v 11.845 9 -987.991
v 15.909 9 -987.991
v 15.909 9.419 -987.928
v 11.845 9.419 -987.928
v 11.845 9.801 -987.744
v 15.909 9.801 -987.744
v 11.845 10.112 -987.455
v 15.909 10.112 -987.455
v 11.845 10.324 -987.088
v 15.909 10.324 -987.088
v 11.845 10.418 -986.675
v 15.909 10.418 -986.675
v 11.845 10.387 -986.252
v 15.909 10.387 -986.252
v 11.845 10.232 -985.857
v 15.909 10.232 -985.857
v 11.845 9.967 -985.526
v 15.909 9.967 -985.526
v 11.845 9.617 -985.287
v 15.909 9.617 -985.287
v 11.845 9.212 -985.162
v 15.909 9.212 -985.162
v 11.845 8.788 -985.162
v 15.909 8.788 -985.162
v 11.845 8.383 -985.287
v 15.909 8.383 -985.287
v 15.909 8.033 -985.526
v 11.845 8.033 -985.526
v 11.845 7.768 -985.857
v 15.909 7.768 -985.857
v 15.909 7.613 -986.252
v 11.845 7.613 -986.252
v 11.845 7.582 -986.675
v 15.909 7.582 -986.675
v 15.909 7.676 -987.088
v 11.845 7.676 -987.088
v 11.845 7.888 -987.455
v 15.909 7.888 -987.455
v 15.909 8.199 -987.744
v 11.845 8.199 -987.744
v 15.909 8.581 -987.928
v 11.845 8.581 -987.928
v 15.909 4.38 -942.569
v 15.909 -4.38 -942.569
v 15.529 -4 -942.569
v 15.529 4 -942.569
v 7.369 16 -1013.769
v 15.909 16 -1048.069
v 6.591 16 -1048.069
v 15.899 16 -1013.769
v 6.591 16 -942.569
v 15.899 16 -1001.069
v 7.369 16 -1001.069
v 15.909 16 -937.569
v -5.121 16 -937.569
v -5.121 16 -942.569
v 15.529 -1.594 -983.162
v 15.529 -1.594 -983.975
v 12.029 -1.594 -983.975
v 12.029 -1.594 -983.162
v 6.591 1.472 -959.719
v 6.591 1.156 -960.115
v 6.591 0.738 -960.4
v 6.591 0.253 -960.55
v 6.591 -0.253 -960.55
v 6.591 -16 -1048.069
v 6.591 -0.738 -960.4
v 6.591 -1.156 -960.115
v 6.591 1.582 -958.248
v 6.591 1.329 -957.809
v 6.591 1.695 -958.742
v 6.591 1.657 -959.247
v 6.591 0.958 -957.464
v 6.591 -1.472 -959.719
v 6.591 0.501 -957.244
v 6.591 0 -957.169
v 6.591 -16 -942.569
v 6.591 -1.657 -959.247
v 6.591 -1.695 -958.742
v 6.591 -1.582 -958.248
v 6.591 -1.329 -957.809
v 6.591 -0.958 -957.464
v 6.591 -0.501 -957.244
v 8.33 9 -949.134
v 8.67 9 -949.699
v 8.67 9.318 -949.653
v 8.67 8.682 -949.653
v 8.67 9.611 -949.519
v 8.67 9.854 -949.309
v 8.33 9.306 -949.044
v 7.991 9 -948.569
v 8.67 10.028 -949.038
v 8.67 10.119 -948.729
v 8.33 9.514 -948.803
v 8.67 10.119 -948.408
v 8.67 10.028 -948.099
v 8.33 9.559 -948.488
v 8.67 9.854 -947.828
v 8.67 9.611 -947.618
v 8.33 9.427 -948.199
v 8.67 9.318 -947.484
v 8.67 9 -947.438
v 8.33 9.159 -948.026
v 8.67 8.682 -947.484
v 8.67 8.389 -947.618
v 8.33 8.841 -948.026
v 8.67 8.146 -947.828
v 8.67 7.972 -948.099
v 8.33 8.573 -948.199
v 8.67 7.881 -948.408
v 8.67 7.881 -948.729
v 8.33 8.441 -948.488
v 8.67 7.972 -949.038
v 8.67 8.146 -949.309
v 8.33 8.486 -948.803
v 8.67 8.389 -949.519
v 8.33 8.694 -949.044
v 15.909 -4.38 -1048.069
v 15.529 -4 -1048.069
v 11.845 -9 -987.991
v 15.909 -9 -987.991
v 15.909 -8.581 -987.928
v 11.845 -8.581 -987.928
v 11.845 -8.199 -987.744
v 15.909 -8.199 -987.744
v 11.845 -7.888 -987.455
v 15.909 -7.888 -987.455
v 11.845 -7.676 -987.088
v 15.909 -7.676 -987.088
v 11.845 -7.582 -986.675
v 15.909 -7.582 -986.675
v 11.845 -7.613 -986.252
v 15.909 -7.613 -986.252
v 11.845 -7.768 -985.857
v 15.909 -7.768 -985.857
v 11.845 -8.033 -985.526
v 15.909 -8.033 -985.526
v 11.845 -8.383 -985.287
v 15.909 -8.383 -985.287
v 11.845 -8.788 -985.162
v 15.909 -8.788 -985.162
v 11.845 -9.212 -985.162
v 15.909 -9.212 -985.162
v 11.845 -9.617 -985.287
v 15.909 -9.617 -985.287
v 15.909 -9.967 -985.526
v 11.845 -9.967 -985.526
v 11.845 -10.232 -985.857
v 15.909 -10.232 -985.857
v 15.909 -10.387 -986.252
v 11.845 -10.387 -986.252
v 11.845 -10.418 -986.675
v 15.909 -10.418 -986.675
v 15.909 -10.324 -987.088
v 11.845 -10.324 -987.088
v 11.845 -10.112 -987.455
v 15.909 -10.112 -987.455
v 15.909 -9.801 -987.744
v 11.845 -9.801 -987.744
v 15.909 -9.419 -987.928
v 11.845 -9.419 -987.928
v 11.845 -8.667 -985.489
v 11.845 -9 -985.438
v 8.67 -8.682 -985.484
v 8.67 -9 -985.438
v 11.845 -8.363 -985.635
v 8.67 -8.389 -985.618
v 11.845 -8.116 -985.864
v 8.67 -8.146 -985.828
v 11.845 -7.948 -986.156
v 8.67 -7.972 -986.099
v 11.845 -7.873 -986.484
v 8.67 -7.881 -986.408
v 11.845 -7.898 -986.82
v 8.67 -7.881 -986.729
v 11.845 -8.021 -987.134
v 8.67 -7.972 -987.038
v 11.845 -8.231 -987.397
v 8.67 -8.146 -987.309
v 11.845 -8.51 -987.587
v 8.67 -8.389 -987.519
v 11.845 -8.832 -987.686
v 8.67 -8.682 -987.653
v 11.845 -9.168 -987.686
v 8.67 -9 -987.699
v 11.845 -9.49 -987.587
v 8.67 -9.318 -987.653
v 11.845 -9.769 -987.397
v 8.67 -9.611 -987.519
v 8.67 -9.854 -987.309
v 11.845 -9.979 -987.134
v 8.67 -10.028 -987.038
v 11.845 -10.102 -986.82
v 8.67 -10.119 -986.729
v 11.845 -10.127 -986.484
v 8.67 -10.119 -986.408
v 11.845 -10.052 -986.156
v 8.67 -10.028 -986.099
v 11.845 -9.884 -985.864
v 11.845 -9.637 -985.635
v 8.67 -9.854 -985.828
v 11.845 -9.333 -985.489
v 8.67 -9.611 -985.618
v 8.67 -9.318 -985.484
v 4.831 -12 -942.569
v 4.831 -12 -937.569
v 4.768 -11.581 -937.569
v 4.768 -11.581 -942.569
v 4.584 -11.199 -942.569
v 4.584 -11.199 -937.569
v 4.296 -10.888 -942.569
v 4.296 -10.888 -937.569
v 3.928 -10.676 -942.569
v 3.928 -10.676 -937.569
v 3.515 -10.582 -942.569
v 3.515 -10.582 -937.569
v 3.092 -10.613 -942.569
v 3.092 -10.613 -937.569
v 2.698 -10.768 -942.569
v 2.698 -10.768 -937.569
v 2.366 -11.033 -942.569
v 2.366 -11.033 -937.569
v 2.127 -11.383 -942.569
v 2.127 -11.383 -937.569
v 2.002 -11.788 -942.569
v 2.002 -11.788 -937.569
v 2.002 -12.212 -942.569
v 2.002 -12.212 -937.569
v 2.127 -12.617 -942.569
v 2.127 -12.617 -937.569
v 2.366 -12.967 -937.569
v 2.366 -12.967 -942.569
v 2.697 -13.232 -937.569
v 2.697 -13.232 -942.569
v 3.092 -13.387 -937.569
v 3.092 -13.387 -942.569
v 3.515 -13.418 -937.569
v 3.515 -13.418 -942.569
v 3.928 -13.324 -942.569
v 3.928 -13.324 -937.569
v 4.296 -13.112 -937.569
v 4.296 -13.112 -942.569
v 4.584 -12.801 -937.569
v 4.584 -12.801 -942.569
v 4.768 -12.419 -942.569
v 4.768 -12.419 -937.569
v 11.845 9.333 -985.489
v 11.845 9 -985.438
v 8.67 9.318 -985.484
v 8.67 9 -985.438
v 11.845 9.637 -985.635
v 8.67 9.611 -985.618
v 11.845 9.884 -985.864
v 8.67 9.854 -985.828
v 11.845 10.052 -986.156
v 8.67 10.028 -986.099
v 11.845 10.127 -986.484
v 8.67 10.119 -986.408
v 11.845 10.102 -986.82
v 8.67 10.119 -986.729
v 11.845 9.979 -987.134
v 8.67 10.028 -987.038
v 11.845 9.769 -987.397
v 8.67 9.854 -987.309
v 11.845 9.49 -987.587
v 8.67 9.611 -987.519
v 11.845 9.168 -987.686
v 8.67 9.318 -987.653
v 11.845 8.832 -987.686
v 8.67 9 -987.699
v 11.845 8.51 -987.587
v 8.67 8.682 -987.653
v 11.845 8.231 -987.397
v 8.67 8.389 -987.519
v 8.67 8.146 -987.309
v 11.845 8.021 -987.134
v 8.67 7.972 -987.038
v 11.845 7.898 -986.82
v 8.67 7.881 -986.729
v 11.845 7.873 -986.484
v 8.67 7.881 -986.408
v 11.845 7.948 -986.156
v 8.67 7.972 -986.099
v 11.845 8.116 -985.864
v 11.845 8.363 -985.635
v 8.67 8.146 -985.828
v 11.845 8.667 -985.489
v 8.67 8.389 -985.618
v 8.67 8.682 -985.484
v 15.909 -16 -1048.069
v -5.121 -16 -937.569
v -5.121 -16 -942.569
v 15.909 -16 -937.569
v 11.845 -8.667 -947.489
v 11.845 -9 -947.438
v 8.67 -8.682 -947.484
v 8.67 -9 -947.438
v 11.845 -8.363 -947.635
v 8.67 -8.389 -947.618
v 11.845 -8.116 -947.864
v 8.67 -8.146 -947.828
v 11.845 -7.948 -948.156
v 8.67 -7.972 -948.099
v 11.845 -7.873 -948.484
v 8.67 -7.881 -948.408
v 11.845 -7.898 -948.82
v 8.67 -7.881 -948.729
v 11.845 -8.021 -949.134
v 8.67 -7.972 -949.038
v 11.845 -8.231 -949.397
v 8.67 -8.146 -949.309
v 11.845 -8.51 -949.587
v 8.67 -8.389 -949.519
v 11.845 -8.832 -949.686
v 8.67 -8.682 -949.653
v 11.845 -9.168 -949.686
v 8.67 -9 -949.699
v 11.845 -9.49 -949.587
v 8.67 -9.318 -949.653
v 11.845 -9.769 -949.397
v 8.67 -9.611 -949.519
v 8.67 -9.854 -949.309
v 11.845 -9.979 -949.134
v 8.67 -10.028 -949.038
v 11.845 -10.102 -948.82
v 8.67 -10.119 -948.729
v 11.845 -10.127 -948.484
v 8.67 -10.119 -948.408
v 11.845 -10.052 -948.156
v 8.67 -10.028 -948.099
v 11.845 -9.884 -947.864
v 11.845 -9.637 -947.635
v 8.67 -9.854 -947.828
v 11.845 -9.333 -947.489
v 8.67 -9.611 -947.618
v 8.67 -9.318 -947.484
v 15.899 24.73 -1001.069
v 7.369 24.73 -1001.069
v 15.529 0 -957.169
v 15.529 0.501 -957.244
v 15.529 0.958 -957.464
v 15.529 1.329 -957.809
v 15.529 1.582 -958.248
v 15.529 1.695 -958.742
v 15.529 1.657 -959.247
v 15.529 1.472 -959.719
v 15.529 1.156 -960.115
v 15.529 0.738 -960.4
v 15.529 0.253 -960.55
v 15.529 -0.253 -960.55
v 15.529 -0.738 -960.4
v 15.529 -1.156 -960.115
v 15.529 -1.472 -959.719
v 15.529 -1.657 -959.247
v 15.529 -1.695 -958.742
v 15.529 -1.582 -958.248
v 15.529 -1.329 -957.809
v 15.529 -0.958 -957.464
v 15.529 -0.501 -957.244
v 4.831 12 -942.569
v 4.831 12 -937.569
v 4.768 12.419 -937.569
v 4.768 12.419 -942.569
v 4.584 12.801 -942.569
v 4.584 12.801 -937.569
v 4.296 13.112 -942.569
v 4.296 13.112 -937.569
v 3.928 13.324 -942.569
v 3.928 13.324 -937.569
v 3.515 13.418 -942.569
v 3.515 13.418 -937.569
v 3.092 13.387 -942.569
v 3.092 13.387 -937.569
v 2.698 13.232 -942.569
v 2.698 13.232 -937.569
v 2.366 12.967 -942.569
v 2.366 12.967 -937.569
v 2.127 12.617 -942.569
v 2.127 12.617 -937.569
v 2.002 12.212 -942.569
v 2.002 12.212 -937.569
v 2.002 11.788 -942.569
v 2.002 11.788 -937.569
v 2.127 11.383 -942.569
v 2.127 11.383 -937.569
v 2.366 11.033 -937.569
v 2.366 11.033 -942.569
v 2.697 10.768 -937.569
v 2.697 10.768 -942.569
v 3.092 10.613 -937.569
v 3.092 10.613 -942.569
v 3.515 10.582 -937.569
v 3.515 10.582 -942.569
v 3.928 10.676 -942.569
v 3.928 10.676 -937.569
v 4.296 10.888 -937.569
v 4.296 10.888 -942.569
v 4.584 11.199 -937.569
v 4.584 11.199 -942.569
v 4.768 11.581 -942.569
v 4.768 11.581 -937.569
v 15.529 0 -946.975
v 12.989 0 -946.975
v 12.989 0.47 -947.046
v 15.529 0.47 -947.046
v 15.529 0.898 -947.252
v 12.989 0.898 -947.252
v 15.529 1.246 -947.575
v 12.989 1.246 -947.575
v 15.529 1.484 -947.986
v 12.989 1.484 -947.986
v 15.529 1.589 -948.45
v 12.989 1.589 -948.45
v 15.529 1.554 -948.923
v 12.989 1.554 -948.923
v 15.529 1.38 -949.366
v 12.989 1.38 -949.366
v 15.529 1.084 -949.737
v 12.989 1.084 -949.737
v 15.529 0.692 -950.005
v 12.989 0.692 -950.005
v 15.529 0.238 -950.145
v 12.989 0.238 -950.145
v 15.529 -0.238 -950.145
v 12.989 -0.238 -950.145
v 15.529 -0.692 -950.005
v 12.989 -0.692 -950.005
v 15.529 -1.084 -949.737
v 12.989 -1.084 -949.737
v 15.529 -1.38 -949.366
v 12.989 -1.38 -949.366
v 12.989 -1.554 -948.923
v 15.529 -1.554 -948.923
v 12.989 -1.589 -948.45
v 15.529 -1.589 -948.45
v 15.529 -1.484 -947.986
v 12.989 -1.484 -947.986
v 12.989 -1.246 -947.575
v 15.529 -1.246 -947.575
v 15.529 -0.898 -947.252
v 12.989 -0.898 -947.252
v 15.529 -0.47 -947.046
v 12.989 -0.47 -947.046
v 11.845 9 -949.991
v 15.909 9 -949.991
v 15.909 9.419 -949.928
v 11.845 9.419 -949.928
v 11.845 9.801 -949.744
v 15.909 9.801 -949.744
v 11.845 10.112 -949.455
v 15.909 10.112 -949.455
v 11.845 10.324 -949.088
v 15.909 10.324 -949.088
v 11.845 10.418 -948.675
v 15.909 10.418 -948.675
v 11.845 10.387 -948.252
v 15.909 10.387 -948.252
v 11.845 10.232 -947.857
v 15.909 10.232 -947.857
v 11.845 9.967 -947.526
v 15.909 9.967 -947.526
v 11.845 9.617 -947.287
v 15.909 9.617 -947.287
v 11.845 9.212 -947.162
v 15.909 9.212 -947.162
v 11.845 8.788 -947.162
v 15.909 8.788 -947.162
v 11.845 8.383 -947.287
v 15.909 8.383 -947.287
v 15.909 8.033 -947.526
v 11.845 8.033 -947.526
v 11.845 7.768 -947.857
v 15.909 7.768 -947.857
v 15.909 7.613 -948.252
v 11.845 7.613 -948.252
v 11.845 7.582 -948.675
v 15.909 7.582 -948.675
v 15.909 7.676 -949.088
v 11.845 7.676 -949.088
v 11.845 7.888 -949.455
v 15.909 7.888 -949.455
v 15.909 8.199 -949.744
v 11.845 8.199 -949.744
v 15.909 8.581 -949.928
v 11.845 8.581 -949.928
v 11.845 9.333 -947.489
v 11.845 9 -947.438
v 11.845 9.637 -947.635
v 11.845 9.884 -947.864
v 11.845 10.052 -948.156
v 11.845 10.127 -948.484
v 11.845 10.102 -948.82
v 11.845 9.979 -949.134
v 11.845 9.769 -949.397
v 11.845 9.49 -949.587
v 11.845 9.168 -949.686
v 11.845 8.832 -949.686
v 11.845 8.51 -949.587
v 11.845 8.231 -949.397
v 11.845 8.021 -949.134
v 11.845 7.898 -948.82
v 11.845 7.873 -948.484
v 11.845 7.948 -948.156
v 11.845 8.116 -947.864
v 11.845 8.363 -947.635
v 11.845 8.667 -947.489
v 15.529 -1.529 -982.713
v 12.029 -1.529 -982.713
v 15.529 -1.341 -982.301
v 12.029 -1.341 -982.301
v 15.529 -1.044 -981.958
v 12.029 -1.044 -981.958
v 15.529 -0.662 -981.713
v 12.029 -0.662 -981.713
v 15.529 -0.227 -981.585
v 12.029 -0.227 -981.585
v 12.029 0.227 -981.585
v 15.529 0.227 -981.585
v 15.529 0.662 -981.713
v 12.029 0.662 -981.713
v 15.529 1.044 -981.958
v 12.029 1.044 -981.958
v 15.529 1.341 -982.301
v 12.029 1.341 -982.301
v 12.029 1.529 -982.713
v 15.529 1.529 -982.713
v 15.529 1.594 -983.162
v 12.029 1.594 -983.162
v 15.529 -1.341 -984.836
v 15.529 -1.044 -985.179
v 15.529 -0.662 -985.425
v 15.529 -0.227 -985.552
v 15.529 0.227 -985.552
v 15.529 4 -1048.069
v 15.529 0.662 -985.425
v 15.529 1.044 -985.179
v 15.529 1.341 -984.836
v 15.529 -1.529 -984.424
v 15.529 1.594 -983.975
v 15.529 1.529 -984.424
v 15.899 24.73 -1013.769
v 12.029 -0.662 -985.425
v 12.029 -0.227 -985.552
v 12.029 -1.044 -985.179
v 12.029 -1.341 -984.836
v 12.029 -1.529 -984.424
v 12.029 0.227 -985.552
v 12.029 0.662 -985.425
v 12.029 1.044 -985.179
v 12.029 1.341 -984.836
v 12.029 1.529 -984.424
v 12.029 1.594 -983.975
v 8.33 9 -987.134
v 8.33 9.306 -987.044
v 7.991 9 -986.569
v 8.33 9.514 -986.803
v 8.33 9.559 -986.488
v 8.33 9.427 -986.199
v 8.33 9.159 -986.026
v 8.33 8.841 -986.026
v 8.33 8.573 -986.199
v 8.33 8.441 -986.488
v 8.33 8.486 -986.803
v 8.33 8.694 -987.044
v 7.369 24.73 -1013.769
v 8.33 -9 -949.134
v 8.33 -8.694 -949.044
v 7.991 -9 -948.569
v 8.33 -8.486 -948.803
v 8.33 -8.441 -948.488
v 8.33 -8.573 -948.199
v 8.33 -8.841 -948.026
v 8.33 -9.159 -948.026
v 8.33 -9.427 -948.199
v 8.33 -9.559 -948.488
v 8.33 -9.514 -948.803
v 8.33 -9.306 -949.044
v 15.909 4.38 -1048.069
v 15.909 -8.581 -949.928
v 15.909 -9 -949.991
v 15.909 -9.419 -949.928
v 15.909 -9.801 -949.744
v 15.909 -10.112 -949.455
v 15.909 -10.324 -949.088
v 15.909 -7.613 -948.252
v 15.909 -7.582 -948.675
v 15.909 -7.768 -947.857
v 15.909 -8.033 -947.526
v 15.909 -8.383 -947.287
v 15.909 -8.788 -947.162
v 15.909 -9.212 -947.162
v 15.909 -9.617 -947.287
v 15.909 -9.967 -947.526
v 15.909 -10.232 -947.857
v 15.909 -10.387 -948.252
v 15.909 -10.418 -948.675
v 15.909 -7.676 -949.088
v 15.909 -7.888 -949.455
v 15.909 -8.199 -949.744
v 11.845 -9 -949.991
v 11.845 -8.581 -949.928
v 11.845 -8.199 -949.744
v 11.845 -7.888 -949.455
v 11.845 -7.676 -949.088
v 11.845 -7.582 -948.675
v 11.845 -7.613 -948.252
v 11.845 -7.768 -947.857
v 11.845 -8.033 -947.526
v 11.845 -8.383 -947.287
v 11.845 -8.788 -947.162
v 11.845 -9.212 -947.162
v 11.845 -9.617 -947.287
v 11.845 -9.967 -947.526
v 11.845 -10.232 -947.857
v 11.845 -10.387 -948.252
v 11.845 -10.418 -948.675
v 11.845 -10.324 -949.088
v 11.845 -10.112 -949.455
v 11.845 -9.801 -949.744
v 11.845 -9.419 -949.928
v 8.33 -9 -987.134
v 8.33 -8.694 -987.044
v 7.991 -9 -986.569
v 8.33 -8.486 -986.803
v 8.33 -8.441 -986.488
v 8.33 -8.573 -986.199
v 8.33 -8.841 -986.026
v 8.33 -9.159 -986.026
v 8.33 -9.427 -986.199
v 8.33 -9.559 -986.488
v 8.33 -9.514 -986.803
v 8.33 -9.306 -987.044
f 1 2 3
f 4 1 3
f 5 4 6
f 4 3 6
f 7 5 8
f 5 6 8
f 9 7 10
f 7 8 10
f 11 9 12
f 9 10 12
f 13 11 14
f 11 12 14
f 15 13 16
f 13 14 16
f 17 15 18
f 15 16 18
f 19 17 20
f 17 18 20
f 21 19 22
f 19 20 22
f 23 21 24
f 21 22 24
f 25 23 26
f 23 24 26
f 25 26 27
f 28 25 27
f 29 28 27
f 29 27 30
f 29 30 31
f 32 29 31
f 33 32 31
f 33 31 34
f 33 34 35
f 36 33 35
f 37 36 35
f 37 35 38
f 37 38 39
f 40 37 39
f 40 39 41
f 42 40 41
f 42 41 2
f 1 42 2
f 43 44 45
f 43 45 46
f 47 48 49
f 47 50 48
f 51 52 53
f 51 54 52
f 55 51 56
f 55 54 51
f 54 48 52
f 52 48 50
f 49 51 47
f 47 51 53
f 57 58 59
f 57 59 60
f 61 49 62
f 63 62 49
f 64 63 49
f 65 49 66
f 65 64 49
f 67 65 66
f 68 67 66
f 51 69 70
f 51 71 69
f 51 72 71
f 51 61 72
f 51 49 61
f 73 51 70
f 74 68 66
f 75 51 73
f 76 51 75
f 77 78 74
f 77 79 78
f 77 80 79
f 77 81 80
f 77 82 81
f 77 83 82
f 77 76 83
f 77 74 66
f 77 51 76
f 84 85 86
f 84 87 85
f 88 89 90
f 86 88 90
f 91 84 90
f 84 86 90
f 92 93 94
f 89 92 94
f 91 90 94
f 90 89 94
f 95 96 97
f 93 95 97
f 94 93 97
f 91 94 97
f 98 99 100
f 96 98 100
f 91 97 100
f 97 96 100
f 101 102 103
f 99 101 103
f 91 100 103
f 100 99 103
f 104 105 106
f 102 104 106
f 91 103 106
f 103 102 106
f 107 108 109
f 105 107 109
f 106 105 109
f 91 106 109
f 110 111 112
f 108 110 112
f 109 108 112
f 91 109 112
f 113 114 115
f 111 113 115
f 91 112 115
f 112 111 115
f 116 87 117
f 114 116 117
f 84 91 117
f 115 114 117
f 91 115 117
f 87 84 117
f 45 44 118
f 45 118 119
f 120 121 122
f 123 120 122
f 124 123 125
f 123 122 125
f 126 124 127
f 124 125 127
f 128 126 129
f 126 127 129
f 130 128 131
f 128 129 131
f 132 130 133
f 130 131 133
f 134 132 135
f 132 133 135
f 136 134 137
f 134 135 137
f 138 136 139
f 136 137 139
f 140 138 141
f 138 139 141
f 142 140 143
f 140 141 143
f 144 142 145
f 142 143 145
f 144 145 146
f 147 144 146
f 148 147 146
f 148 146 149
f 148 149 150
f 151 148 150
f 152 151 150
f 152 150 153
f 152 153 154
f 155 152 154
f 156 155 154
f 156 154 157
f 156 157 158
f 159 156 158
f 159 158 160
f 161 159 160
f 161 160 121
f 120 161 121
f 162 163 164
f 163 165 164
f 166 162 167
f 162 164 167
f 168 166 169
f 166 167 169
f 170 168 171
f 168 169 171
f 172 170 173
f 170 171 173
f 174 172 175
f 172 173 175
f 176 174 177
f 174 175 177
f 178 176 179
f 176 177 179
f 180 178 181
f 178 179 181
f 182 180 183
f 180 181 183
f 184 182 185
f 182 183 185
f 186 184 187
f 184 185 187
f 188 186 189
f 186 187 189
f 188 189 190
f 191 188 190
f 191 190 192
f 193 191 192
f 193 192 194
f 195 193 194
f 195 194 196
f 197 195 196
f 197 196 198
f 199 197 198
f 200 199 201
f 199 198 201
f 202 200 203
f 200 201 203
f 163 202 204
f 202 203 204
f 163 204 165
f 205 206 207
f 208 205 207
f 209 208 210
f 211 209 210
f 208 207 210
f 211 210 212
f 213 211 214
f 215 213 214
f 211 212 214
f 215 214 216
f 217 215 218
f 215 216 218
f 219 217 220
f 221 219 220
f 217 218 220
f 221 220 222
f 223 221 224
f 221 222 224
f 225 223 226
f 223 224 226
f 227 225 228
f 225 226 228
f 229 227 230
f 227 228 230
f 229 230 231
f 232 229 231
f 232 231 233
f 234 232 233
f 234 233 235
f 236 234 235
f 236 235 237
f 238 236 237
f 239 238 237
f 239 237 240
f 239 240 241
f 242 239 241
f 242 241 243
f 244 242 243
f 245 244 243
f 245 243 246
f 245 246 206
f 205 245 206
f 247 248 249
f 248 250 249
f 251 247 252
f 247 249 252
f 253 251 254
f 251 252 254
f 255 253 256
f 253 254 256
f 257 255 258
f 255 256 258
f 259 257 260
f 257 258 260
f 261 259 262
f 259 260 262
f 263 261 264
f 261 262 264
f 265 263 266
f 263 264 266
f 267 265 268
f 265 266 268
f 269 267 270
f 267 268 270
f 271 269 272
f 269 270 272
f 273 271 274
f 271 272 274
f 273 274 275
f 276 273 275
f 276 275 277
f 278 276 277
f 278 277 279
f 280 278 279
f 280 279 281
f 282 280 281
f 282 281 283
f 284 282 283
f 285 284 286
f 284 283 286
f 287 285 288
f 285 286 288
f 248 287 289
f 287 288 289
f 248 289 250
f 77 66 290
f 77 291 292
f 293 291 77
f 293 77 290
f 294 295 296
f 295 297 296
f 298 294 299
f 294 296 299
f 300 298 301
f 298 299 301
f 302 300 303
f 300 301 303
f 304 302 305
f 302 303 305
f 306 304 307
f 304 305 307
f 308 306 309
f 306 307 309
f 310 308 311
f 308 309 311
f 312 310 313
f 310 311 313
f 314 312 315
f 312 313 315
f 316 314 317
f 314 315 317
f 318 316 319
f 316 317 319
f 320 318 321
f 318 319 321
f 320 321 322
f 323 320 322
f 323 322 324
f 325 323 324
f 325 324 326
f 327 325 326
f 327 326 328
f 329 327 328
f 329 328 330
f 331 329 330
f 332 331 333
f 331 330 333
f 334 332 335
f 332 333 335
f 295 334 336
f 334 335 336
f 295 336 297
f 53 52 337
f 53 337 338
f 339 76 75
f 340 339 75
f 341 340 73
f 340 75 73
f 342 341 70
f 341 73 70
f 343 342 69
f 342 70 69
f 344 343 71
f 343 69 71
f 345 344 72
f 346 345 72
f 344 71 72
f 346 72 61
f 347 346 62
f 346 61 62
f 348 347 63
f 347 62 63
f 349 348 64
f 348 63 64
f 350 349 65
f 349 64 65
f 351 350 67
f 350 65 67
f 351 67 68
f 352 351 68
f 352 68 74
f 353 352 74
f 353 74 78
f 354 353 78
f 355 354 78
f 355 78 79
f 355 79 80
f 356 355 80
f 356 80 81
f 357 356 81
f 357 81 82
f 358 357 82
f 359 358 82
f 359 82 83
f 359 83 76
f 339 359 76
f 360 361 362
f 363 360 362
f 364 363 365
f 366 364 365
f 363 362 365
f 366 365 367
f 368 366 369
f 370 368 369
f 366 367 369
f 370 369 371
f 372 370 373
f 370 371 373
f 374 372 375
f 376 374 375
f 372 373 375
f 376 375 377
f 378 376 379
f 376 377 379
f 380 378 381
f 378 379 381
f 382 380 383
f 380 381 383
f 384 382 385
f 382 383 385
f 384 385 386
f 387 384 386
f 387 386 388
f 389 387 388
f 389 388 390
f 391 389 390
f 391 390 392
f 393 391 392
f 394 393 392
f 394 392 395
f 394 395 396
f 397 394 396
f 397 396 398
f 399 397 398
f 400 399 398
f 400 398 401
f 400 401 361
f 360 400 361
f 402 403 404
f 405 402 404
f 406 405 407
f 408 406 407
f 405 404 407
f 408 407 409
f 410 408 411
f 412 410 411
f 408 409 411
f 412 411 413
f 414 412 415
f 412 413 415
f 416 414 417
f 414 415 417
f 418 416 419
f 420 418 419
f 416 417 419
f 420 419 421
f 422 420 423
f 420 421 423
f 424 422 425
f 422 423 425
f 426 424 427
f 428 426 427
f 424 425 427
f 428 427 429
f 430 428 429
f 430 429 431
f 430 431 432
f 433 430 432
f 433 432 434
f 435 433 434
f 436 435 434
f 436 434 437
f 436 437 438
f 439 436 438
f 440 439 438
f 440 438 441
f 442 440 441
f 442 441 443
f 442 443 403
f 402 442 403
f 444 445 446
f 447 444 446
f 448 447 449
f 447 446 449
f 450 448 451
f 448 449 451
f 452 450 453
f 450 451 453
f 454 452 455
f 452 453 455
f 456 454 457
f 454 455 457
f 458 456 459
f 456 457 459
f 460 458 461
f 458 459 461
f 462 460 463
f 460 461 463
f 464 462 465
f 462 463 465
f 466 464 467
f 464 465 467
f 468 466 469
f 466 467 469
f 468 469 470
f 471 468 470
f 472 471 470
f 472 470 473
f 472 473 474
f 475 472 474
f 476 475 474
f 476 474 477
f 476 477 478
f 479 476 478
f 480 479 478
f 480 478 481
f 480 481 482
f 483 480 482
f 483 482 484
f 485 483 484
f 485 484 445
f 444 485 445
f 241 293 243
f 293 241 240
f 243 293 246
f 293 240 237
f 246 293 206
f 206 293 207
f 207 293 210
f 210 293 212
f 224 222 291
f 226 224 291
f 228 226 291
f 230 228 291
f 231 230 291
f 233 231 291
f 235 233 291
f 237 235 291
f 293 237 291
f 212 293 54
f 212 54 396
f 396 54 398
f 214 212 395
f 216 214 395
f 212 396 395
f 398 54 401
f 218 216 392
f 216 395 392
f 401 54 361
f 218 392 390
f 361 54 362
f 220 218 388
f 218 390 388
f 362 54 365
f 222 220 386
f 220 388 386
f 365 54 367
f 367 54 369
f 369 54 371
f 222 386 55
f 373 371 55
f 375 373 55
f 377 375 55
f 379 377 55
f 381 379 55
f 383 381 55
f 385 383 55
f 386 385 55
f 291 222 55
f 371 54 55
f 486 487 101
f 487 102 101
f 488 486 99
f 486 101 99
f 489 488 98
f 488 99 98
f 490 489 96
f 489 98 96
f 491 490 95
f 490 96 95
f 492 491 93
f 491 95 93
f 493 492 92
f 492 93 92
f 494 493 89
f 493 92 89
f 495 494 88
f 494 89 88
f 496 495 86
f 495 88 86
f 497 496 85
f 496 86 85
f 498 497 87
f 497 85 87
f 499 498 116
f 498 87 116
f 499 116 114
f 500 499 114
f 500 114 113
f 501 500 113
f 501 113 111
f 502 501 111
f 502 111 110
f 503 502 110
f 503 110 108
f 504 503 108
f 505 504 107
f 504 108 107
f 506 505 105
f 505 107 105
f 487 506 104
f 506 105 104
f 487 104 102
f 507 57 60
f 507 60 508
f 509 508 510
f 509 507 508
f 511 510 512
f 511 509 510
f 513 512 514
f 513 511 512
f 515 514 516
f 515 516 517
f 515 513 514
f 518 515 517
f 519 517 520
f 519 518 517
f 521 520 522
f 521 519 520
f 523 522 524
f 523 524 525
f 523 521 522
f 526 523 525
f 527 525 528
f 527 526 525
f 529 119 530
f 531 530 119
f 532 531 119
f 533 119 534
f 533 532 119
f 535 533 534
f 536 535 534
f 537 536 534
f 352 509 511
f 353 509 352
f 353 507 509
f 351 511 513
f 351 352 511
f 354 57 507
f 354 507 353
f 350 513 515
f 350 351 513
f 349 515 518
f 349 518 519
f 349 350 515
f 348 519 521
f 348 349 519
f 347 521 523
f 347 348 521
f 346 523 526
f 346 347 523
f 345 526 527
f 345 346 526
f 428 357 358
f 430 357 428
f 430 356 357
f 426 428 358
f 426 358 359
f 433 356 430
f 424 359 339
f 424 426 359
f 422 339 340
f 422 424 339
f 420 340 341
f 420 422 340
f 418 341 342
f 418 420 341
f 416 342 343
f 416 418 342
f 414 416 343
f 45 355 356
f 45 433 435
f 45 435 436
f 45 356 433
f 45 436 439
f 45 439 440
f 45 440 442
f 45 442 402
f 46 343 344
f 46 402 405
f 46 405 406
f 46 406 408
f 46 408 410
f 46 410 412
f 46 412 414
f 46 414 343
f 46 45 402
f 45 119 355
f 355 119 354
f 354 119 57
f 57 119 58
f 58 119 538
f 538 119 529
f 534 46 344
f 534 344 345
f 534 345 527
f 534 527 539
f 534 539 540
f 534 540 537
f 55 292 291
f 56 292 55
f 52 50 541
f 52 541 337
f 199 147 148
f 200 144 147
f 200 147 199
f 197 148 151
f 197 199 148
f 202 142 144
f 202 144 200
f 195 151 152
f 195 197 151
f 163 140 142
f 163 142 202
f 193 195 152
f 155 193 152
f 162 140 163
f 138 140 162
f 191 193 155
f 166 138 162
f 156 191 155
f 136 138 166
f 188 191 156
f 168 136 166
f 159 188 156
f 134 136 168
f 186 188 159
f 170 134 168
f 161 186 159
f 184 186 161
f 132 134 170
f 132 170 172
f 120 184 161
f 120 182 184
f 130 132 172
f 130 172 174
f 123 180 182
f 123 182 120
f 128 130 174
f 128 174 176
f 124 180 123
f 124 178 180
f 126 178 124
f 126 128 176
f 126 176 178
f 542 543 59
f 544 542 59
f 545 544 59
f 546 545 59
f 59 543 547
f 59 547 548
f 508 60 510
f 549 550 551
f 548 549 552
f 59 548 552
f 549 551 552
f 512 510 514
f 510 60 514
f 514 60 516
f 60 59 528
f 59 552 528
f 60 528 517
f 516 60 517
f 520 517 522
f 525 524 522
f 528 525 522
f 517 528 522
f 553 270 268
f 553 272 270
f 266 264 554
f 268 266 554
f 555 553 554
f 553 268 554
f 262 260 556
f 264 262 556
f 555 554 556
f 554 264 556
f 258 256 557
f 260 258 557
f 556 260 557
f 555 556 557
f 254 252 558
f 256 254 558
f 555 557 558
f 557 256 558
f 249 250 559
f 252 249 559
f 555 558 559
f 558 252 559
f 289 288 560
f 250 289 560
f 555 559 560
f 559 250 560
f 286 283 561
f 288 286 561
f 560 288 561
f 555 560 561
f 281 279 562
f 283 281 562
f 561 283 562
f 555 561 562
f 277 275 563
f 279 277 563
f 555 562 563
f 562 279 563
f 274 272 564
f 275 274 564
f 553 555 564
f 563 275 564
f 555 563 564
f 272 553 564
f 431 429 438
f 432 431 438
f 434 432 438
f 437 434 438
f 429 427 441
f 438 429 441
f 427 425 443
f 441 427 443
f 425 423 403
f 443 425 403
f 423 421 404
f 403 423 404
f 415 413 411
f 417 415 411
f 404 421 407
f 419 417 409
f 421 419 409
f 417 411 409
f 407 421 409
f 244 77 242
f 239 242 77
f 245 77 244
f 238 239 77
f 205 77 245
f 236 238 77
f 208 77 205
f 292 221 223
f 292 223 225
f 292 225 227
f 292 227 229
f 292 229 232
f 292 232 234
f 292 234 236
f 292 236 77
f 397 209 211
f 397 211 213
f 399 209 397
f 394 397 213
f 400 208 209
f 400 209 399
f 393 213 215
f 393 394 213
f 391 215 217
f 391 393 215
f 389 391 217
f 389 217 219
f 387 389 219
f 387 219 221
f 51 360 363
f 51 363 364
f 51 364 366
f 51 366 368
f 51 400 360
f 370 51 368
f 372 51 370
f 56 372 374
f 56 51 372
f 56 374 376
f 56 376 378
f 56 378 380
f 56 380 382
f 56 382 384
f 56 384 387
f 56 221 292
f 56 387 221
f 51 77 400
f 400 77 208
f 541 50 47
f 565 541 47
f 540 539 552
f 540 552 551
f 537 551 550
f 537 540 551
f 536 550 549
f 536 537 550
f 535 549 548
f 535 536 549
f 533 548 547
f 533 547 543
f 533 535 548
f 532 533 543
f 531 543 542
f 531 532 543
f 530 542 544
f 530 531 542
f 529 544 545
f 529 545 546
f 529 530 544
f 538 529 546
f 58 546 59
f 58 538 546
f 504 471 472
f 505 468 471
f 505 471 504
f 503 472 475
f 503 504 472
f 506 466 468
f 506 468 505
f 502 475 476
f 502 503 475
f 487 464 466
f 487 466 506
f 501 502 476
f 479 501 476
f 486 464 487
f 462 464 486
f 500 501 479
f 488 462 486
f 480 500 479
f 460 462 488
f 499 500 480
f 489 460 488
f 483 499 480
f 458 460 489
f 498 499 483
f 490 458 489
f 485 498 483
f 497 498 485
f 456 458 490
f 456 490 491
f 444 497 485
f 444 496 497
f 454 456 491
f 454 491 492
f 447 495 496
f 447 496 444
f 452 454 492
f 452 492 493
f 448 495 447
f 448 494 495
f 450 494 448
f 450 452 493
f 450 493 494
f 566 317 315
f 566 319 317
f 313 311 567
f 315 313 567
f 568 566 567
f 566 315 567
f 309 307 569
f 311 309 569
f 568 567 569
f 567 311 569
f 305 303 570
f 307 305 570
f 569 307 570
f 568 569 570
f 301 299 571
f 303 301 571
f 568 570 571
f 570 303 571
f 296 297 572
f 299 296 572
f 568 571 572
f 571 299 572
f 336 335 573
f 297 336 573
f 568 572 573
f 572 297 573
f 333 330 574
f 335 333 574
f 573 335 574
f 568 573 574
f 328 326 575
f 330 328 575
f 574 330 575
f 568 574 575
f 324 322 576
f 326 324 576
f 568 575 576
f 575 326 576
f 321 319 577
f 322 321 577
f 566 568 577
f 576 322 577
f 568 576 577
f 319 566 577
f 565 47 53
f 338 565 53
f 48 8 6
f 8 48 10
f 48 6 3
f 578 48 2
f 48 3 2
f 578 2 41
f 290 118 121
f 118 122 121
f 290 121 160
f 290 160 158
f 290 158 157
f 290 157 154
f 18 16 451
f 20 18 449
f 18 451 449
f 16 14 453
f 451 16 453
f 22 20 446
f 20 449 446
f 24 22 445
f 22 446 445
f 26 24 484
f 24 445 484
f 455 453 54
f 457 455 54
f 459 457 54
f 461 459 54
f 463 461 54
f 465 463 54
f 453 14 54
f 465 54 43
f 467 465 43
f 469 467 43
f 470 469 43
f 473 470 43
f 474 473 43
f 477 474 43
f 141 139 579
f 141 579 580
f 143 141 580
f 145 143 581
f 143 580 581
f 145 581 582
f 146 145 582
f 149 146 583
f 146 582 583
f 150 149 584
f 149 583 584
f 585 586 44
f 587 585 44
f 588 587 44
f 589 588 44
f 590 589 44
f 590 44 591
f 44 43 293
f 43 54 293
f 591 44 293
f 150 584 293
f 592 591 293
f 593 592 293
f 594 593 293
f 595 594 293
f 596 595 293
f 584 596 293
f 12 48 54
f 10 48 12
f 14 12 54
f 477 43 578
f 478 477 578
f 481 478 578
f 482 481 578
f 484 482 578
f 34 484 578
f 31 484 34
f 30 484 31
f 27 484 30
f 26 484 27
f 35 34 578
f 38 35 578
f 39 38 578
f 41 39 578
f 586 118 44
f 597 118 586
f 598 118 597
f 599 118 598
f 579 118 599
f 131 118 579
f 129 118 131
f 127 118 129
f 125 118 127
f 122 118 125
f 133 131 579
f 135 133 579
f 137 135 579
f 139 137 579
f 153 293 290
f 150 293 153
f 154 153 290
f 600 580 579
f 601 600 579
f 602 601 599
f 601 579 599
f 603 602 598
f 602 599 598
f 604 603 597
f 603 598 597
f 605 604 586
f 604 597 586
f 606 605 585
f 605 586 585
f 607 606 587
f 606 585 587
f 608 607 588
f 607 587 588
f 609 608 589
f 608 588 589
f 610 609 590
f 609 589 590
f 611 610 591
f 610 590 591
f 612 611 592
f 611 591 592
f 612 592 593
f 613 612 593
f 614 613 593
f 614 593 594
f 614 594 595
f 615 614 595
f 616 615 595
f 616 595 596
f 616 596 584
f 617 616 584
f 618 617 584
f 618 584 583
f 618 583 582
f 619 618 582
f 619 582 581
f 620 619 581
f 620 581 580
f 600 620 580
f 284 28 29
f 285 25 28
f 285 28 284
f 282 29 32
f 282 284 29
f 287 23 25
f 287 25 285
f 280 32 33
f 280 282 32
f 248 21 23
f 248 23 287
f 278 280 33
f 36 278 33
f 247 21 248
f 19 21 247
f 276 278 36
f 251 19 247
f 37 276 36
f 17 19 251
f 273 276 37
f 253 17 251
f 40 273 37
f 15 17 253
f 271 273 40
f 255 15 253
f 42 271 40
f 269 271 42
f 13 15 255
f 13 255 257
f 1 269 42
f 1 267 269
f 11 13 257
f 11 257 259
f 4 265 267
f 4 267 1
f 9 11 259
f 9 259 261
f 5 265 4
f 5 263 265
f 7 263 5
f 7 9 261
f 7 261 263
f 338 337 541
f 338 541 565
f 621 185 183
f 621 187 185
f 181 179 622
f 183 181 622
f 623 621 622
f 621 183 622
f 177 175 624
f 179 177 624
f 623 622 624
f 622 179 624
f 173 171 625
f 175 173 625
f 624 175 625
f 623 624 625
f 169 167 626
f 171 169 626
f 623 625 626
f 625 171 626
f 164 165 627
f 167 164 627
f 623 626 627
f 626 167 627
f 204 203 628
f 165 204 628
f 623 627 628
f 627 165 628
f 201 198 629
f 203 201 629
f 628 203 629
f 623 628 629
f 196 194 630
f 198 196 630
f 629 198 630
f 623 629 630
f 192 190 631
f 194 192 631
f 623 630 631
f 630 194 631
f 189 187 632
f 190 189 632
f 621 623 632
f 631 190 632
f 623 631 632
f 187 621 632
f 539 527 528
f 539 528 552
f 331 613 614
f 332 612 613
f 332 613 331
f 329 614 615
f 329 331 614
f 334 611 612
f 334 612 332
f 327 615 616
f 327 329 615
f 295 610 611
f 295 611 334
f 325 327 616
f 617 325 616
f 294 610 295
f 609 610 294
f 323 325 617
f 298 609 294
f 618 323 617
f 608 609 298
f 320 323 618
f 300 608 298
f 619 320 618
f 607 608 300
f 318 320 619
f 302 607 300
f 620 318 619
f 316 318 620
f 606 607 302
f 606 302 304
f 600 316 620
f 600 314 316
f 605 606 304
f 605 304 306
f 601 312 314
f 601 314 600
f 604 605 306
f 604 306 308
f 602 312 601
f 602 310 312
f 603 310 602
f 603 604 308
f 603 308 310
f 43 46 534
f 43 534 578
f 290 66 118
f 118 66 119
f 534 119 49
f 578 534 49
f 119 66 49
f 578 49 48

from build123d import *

# Parameters (mm, degrees)
BASE_EXTRUDE_DEPTH              = 5
BOSS_EXTRUDE1_DEPTH             = 105.5
BOSS_EXTRUDE3_DEPTH             = 5
F_3_4_DIAMETER_HOLE1_D          = 3.4
F_4_40_TAPPED_HOLE1_D           = 2.2606
F_4_40_TAPPED_HOLE1_DEPTH       = 7.239
F_4_40_TAPPED_HOLE1_CBORE_D     = 2.8448
F_4_40_TAPPED_HOLE1_CBORE_DEPTH = 4.064
F_4_40_TAPPED_HOLE1_TIP         = 0.679152758
F_4_40_TAPPED_HOLE2_D           = 2.2606
F_4_40_TAPPED_HOLE2_CBORE_D     = 2.8448
F_4_40_TAPPED_HOLE2_CBORE_DEPTH = 5.6896
CUT_EXTRUDE1_DEPTH              = 3.5
HOLE1_D                         = 3.1877
HOLE1_DEPTH                     = 2.54
SKETCH14_W                      = 8.53
SKETCH14_H                      = 12.7
BOSS_EXTRUDE2_DEPTH             = 8.73


with BuildPart() as part:
    # Sketch1 → Base-Extrude (new body)
    with BuildSketch(Plane.XY.offset(-942.568622791)):
        Polygon((-5.1213, 16), (15.9087, 16), (15.9087, 4.38), (15.5287, 4), (15.5287, -4), (15.9087, -4.38), (15.9087, -16), (-5.1213, -16), align=None)
    extrude(amount=BASE_EXTRUDE_DEPTH)

    # Sketch3 → Boss-Extrude1 (add)
    with BuildSketch(Plane(origin=(0, 0, -942.568622791), x_dir=(-1, 0, 0), z_dir=(0, 0, -1))):
        Polygon((-15.9087, 4.38), (-15.9087, 16), (-6.5913, 16), (-6.5913, -16), (-15.9087, -16), (-15.9087, -4.38), (-15.5287, -4), (-15.5287, 4), align=None)
    extrude(amount=BOSS_EXTRUDE1_DEPTH)

    # Sketch15 → Boss-Extrude3 (add)
    with BuildSketch(Plane.XY.offset(-937.568622791)):
        Polygon((15.9087, -4.38), (15.5287, -4), (15.5287, 4), (15.9087, 4.38), align=None)
    extrude(amount=-BOSS_EXTRUDE3_DEPTH)

    # 3.4 Diameter Hole1 (through all)
    with Locations(Plane(origin=(15.5287, 0, 0), x_dir=(0, 0, -1), z_dir=(1, 0, 0))):
        with Locations((958.868622791, 0)):
            Hole(F_3_4_DIAMETER_HOLE1_D / 2)

    # #4-40 Tapped Hole1
    with Locations(Plane(origin=(15.9087, 0, 0), x_dir=(0, 0, -1), z_dir=(1, 0, 0))):
        with Locations((948.568622791, 9), (986.568622791, 9), (948.568622791, -9), (986.568622791, -9)):
            CounterBoreHole(F_4_40_TAPPED_HOLE1_D / 2, F_4_40_TAPPED_HOLE1_CBORE_D / 2, F_4_40_TAPPED_HOLE1_CBORE_DEPTH, depth=F_4_40_TAPPED_HOLE1_DEPTH)
            with Locations((0, 0, -(F_4_40_TAPPED_HOLE1_DEPTH + F_4_40_TAPPED_HOLE1_TIP / 2))):  # 118° drill point
                Cone(0, F_4_40_TAPPED_HOLE1_D / 2, F_4_40_TAPPED_HOLE1_TIP, mode=Mode.SUBTRACT)

    # #4-40 Tapped Hole2 (through all)
    with Locations(Plane.XY.offset(-937.568622791)):
        with Locations((3.4087, 12), (3.4087, -12)):
            CounterBoreHole(F_4_40_TAPPED_HOLE2_D / 2, F_4_40_TAPPED_HOLE2_CBORE_D / 2, F_4_40_TAPPED_HOLE2_CBORE_DEPTH)

    # Sketch11 → Cut-Extrude1 (cut)
    with BuildSketch(Plane(origin=(15.5287, 0, 0), x_dir=(0, 0, -1), z_dir=(1, 0, 0))):
        with BuildLine():
            Line((983.162472791, 1.59385), (983.974772791, 1.59385))
            ThreePointArc((983.974772791, 1.59385), (985.568622791, 0), (983.974772791, -1.59385))
            Line((983.974772791, -1.59385), (983.162472791, -1.59385))
            ThreePointArc((983.162472791, -1.59385), (981.568622791, 0), (983.162472791, 1.59385))
        make_face()
    extrude(amount=-CUT_EXTRUDE1_DEPTH, mode=Mode.SUBTRACT)

    # Hole1
    with Locations(Plane(origin=(15.5287, 0, 0), x_dir=(0, 0, -1), z_dir=(1, 0, 0))):
        with Locations((948.568622791, 0)):
            Hole(HOLE1_D / 2, depth=HOLE1_DEPTH)

    # Sketch14 → Boss-Extrude2 (add)
    with BuildSketch(Plane(origin=(0, 16, 0), x_dir=(-1, 0, 0), z_dir=(0, 1, 0))):
        with Locations((-11.6337, -1007.418622791)):
            Rectangle(SKETCH14_W, SKETCH14_H)
    extrude(amount=BOSS_EXTRUDE2_DEPTH)


solid = part.part
